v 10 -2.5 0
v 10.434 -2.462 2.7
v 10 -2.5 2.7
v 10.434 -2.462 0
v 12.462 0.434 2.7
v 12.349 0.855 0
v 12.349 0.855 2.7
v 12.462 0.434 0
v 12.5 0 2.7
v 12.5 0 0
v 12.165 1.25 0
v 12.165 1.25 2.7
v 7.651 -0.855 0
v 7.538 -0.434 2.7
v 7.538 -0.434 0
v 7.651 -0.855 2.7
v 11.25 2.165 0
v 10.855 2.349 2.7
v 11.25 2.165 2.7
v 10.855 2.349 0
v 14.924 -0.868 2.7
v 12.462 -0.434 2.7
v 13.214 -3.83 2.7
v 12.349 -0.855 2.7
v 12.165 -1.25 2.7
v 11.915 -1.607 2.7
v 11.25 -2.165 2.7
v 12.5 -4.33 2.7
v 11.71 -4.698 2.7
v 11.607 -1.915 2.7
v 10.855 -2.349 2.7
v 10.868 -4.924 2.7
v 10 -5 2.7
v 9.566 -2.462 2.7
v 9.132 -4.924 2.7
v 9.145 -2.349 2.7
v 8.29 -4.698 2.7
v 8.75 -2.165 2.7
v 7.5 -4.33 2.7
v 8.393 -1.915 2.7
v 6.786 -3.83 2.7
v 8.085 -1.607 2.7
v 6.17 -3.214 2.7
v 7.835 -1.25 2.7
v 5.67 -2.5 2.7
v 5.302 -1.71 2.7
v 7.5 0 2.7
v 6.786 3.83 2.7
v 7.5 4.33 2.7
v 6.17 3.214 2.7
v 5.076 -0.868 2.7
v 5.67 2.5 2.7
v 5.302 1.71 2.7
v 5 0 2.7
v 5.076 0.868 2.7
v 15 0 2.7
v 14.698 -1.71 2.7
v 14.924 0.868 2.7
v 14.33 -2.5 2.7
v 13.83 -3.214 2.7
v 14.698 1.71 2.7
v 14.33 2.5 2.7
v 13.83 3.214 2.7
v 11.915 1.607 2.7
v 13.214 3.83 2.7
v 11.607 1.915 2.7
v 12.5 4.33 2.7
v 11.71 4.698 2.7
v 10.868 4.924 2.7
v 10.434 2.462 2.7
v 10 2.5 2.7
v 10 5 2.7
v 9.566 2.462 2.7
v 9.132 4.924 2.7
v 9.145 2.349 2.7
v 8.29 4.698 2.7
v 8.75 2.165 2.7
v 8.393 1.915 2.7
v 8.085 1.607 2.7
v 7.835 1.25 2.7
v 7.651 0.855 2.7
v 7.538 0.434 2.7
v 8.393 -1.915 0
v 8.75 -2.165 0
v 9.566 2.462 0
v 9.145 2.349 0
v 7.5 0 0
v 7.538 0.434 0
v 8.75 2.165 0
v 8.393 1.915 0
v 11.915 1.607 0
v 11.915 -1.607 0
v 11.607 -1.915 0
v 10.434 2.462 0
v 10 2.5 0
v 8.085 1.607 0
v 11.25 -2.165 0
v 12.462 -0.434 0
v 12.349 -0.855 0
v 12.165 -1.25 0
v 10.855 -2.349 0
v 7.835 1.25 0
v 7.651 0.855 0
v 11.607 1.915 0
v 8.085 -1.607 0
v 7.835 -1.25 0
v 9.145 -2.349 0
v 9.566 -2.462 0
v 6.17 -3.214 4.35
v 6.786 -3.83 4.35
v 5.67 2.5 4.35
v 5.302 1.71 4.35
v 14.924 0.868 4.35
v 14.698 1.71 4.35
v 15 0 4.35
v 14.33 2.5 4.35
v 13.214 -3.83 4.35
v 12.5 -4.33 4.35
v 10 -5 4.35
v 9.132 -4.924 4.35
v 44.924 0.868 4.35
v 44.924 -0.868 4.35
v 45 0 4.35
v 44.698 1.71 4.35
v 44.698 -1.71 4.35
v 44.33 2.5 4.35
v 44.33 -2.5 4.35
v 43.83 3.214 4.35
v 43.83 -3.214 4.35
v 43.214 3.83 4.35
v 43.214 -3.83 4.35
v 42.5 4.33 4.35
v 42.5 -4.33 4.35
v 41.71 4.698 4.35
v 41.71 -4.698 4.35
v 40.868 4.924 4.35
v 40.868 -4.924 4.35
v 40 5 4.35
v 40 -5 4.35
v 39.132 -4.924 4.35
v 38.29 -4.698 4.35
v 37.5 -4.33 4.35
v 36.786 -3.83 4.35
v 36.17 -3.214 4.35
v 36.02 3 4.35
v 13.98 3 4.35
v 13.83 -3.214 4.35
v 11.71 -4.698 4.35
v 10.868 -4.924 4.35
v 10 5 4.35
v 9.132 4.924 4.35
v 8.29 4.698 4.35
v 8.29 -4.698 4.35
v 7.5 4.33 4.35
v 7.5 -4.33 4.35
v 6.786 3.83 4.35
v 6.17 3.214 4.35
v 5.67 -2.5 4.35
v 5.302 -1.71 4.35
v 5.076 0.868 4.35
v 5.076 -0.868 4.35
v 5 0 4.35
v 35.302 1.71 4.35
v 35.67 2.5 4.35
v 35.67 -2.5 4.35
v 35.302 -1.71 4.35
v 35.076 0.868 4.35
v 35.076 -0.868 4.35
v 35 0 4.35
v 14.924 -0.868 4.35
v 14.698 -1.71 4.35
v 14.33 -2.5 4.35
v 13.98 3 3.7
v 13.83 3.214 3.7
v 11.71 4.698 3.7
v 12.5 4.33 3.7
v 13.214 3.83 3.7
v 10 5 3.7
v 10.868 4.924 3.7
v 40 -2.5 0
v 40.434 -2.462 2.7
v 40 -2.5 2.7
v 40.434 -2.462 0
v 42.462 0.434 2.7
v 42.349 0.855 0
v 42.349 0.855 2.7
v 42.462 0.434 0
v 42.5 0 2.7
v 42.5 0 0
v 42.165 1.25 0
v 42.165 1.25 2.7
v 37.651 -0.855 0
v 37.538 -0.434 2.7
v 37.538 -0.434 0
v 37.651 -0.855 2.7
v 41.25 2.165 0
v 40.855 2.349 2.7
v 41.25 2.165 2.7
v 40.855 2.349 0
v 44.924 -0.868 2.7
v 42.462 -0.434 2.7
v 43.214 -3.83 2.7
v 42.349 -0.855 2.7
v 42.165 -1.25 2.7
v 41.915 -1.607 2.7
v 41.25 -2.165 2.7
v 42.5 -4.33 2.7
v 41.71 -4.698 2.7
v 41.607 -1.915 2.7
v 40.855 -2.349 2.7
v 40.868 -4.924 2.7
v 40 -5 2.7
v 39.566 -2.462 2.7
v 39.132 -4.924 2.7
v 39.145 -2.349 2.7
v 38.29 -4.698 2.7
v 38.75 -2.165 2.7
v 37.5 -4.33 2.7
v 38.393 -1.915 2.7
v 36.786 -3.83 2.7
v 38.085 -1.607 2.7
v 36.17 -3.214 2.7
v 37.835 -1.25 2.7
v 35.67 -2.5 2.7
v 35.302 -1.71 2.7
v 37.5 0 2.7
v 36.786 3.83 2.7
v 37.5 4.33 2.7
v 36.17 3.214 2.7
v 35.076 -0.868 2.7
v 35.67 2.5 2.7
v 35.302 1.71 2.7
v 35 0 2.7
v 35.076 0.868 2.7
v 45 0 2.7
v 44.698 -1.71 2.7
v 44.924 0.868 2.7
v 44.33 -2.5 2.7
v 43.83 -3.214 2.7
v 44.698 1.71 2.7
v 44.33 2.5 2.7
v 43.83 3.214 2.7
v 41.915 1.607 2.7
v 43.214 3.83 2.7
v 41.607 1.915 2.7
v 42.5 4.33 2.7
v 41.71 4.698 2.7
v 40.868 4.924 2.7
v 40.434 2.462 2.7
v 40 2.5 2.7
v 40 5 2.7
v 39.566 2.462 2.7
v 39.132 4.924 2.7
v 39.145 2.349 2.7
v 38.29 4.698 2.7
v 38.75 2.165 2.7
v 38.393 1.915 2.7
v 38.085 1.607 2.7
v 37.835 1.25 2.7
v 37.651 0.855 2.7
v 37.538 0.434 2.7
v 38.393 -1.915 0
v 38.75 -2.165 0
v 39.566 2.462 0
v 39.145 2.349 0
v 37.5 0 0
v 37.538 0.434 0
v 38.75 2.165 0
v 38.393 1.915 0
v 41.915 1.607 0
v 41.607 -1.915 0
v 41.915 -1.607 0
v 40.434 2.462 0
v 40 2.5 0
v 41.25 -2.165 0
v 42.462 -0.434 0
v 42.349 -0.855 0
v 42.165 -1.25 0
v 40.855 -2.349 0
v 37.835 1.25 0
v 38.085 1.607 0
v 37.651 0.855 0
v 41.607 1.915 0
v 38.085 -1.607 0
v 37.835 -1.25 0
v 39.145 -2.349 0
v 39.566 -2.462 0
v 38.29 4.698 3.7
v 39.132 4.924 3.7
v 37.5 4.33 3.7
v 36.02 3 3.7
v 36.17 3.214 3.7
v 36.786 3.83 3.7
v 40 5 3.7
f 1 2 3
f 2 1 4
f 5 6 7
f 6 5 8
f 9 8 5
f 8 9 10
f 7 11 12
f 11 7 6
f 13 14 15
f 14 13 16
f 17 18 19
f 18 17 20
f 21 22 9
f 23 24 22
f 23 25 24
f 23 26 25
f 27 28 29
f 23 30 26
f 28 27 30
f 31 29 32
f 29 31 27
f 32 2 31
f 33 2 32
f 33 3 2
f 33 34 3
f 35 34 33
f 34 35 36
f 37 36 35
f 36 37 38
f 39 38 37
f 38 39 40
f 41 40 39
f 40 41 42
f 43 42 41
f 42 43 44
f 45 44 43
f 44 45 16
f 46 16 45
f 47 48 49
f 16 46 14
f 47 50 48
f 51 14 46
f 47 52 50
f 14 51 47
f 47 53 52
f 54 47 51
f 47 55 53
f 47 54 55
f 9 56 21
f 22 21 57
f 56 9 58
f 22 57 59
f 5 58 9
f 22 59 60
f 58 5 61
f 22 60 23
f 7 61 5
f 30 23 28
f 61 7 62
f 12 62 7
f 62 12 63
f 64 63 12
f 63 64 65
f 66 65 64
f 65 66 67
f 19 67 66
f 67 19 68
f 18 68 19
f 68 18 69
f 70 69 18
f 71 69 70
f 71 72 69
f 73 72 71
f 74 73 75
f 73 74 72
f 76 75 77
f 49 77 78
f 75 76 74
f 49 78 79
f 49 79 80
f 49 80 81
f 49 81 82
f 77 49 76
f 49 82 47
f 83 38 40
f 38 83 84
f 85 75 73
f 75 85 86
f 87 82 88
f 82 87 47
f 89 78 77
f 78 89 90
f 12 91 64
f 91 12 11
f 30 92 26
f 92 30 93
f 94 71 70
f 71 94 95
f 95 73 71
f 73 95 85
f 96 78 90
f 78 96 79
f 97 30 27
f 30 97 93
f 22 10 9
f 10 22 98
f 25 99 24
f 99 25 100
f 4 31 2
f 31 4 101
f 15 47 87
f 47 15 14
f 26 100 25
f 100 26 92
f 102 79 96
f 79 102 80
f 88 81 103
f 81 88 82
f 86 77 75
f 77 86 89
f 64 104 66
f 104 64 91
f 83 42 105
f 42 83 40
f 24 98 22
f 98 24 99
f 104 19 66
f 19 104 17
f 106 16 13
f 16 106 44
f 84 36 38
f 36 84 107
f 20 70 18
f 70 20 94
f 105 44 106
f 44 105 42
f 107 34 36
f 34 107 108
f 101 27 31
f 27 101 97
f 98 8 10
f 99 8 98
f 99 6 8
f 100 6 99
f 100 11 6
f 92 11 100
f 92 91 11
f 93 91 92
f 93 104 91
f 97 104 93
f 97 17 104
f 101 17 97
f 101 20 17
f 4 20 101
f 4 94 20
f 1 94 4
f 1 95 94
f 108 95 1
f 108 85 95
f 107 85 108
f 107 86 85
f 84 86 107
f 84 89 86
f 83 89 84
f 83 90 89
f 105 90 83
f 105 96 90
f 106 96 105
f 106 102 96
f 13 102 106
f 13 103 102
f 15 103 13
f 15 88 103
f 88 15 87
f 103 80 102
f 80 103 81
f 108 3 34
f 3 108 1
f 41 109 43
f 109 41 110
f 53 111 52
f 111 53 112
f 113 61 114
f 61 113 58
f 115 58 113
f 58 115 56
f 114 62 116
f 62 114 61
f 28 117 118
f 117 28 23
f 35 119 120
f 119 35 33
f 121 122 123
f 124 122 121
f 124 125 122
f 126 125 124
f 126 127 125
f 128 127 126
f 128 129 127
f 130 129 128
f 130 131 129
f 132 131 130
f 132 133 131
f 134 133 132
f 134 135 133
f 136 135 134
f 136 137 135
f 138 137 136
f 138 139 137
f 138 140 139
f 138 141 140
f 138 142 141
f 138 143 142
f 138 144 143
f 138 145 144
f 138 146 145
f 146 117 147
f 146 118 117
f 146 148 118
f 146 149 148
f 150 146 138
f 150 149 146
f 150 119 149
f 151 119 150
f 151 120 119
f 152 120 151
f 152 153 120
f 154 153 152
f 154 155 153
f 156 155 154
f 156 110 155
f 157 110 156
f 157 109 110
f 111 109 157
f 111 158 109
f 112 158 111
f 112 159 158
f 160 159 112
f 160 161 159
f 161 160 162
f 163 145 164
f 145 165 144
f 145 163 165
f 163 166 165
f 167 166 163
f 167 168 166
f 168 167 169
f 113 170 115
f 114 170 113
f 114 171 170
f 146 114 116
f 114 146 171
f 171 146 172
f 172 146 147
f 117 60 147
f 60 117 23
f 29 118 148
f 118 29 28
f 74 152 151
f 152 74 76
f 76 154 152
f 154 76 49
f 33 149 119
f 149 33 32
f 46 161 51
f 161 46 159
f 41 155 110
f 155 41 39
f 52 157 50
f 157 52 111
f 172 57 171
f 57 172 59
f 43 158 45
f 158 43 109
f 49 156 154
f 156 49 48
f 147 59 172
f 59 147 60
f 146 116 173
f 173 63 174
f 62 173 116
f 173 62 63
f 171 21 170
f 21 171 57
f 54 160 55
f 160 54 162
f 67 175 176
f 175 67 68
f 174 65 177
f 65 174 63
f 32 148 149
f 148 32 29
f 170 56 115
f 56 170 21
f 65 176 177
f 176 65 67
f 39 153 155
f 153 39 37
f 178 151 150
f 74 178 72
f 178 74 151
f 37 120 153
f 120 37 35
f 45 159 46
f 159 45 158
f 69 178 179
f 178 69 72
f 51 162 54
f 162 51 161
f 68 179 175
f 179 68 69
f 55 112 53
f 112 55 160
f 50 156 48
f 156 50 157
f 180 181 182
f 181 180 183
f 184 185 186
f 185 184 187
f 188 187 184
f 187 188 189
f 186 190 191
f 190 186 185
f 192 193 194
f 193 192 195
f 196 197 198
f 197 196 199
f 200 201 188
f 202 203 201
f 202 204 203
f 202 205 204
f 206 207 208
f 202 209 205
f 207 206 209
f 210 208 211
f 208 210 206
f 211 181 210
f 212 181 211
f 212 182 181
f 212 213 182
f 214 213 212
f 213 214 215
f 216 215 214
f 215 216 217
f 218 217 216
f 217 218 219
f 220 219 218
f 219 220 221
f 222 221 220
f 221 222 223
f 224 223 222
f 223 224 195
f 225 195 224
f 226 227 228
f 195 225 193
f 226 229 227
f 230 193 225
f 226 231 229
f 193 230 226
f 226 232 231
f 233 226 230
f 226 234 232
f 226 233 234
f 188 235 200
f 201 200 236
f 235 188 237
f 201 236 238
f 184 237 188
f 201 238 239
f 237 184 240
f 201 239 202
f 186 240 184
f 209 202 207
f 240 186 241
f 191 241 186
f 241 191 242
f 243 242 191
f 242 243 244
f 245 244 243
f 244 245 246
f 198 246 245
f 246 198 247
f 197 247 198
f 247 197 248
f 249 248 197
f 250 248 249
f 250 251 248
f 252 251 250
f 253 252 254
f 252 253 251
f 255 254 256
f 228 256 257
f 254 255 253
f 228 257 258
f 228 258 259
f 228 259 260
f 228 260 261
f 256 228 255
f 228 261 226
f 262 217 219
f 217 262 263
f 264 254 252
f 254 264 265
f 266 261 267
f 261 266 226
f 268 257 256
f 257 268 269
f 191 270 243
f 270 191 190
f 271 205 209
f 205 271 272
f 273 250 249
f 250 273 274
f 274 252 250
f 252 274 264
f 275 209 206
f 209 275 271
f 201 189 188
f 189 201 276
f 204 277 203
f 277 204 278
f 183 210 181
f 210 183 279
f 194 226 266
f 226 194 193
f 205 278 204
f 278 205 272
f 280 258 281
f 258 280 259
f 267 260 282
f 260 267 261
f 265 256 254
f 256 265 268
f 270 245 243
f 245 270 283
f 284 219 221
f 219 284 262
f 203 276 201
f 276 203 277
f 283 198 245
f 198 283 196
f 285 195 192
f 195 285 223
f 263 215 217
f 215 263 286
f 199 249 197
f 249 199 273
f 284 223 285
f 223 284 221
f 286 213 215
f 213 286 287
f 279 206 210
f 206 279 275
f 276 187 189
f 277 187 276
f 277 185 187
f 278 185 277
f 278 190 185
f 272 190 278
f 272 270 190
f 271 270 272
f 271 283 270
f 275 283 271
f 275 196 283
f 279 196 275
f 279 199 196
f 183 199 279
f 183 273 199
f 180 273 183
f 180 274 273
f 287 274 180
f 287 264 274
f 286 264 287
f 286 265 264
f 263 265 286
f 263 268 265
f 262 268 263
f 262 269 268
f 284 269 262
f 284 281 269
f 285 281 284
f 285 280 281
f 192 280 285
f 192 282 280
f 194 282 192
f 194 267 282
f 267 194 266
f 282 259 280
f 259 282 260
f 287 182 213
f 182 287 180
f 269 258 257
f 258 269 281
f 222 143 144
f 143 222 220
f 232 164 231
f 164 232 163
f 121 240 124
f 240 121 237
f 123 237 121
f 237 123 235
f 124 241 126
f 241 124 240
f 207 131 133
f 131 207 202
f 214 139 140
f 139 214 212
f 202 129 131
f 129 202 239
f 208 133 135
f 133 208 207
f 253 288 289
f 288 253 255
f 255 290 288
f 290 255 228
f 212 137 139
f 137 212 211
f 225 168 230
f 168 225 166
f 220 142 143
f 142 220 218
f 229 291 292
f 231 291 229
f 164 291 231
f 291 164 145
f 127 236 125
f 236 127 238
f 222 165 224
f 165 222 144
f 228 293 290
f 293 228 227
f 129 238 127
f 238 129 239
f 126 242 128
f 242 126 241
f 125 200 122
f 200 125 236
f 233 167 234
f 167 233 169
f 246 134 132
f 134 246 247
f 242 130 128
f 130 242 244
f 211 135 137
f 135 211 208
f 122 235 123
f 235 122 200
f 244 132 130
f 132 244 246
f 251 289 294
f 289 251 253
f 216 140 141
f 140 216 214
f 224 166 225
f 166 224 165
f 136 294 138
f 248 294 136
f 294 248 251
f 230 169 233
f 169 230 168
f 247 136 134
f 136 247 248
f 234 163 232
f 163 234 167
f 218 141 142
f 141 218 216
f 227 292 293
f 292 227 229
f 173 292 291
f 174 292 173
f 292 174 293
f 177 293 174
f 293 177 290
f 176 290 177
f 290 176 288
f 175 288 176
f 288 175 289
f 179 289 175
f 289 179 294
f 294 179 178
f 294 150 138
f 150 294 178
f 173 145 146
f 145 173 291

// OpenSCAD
// file: usbshare_settings.scad
pcb_size = [50, 40, 1.6];
pcb_compheight_bot = 2.5;
pcb_compheight_top = 10.5;

box_bottom_thickness = 1;
box_top_thickness = 1;
box_wall_thickness = 1.2;

screwhead_diam = 3.7;


pcb_clearance_left = 1.25;
pcb_clearance_front = 1.25 + 2;
pcb_clearance_right = 1.25;
pcb_clearance_back = 1.25;

pcb_holes = [
    //x, y, diameter
    [2.5, 8.925, 2.3],
    [47.5, 8.925, 2.3],
    [2.5, 37.5, 2.3],
    [47.5, 37.5, 2.3]
];

led_holes = [
//plunge diam = 3.5
    [16.66875, 2, 4],
    [33.3375, 2, 4]
];

button_holes = [
    [10, 5.5, 4],
    [40, 5.5, 4]
];


overprint = 0.15;
studdiam = 5;

box_size = pcb_size 
    + [pcb_clearance_left + pcb_clearance_right, pcb_clearance_front + pcb_clearance_back, 0] // pcb clearance
    + [box_wall_thickness * 2, box_wall_thickness * 2, box_bottom_thickness] // add thicknesses to outline
    + [0, 0, pcb_compheight_bot + pcb_compheight_top]; // component height


echo("box size:", box_size);

box_offset = [ 
    (pcb_clearance_right - pcb_clearance_left) / 2,
    (pcb_clearance_back - pcb_clearance_front) / 2,
    box_size.z / 2 - box_bottom_thickness
];
// file: usbshare_elements.scad
module microusb_cutout(overprint = 0)
{
    //AMP 10118194-0001LF
    width = 6.9;
    height = 1.85;
    chamfer = 0.7;
    metal_thickness = 0.25;
    fins_width = 0.325;
    
    translate([0, metal_thickness, 0])
    offset(r=(metal_thickness + fins_width + overprint))
    {
        polygon([
            [-width / 2, height],
            [width / 2, height],
            [width / 2, chamfer],
            [width / 2 - chamfer, 0],
            [-width / 2 + chamfer, 0],
            [-width / 2, chamfer],
        ]);
    }
}

module usba_cutout(overprint = 0)
{
    // Assmann A-USB A/SMT
    width = 14.5-1;
    height = 7.12;
    height_offset = 0.4;
    roundness = 1;
    
    translate([0, height_offset + height / 2, 0])

    offset(r = roundness)
    {
        square([width - roundness * 2, height - roundness * 2], true);
        circle(r=(roundness + overprint));
    }
}


module stud()
{
    color("#800000")
    {
        for(stud = pcb_holes)
        {
            translate([stud.x, stud.y, box_bottom_thickness])
            {
                cylinder(pcb_compheight_bot, d=studdiam);
            }
        }
    }
}

module board(size, holes)
{
    hole_overlap = 0.2;
    color("#00800080")
    {
        difference()
        {
            cube(size, true);
            for(hole = holes)
            {
                translate([hole.x - size.x / 2, hole.y - size.y / 2, 0])
                {
                    cylinder(size.z + hole_overlap, d=hole.z,center=true);
                }
            }
        }
        
    }
}

module countersunk_screwhole(headdiam, diameter, length)
{
    union()
    {
        cylinder(h=headdiam/2, d1=headdiam, d2=0);
        cylinder(h=length, d1=diameter);
    }
}

module flathead_screwhole(headdiam, headthickness, diam, length)
{
    union()
    {
        cylinder(headthickness, d = headdiam);
        cylinder(headthickness + length, d = diam);
    }
}

module hex_screwhole(head_outer_diam, head_thickness, diam, length)
{
    union()
    {
        //cylinder(d=4.5+0.3, h=2, $fn=6);
        cylinder(d=head_outer_diam, h=head_thickness, $fn=6);
        cylinder(length, d = diam);
    }
}

module akl101_wireholes(pins)
{
    pitch = 5.08;
    wire_hole_diam = 3.5;
    wire_height = 3.3;
    hole_len = 10;
    
    for(i = [1 : pins])
    {
        
        rotate([90, 0, 0])
        translate([pitch * (i - 1 - (pins - 1) / 2), wire_height, hole_len / 2])
        
        cylinder(hole_len, d=wire_hole_diam, center=true);
    }
}

module akl101_screwholes(pins)
{
    pitch = 5.08;
    screw_hole_diam = 3.5;
    hole_len = 10;
    
    for(i = [1 : pins])
    {
        
        translate([pitch * (i - 1 - (pins - 1) / 2), 0, hole_len / 2])
        
        cylinder(hole_len, d=screw_hole_diam, center=true);
    }
}
// main file
$fn = 36;

use <usbshare_elements.scad>;
include <usbshare_settings.scad>;

button_outerheight = 1.5;
button_innerheight = 3 - 1.2 - overprint;

echo(button_innerheight);

hodl_width = 0.65;

module buttons()
{
    for(pos = button_holes)
    {
        translate([pos.x, 0, 0])
        {
            cylinder(box_wall_thickness + button_outerheight, d=5);
            translate([0, 0, box_wall_thickness + button_outerheight])
            {
                cylinder(button_innerheight, d=10);
            }
        }
        
    }
    translate([(button_holes[1].x + button_holes[0].x) / 2, 4, box_wall_thickness + button_outerheight + button_innerheight - hodl_width / 2])
    {
        cube([abs(button_holes[1].x - button_holes[0].x), 2, hodl_width], center=true);
    }

}

buttons();
